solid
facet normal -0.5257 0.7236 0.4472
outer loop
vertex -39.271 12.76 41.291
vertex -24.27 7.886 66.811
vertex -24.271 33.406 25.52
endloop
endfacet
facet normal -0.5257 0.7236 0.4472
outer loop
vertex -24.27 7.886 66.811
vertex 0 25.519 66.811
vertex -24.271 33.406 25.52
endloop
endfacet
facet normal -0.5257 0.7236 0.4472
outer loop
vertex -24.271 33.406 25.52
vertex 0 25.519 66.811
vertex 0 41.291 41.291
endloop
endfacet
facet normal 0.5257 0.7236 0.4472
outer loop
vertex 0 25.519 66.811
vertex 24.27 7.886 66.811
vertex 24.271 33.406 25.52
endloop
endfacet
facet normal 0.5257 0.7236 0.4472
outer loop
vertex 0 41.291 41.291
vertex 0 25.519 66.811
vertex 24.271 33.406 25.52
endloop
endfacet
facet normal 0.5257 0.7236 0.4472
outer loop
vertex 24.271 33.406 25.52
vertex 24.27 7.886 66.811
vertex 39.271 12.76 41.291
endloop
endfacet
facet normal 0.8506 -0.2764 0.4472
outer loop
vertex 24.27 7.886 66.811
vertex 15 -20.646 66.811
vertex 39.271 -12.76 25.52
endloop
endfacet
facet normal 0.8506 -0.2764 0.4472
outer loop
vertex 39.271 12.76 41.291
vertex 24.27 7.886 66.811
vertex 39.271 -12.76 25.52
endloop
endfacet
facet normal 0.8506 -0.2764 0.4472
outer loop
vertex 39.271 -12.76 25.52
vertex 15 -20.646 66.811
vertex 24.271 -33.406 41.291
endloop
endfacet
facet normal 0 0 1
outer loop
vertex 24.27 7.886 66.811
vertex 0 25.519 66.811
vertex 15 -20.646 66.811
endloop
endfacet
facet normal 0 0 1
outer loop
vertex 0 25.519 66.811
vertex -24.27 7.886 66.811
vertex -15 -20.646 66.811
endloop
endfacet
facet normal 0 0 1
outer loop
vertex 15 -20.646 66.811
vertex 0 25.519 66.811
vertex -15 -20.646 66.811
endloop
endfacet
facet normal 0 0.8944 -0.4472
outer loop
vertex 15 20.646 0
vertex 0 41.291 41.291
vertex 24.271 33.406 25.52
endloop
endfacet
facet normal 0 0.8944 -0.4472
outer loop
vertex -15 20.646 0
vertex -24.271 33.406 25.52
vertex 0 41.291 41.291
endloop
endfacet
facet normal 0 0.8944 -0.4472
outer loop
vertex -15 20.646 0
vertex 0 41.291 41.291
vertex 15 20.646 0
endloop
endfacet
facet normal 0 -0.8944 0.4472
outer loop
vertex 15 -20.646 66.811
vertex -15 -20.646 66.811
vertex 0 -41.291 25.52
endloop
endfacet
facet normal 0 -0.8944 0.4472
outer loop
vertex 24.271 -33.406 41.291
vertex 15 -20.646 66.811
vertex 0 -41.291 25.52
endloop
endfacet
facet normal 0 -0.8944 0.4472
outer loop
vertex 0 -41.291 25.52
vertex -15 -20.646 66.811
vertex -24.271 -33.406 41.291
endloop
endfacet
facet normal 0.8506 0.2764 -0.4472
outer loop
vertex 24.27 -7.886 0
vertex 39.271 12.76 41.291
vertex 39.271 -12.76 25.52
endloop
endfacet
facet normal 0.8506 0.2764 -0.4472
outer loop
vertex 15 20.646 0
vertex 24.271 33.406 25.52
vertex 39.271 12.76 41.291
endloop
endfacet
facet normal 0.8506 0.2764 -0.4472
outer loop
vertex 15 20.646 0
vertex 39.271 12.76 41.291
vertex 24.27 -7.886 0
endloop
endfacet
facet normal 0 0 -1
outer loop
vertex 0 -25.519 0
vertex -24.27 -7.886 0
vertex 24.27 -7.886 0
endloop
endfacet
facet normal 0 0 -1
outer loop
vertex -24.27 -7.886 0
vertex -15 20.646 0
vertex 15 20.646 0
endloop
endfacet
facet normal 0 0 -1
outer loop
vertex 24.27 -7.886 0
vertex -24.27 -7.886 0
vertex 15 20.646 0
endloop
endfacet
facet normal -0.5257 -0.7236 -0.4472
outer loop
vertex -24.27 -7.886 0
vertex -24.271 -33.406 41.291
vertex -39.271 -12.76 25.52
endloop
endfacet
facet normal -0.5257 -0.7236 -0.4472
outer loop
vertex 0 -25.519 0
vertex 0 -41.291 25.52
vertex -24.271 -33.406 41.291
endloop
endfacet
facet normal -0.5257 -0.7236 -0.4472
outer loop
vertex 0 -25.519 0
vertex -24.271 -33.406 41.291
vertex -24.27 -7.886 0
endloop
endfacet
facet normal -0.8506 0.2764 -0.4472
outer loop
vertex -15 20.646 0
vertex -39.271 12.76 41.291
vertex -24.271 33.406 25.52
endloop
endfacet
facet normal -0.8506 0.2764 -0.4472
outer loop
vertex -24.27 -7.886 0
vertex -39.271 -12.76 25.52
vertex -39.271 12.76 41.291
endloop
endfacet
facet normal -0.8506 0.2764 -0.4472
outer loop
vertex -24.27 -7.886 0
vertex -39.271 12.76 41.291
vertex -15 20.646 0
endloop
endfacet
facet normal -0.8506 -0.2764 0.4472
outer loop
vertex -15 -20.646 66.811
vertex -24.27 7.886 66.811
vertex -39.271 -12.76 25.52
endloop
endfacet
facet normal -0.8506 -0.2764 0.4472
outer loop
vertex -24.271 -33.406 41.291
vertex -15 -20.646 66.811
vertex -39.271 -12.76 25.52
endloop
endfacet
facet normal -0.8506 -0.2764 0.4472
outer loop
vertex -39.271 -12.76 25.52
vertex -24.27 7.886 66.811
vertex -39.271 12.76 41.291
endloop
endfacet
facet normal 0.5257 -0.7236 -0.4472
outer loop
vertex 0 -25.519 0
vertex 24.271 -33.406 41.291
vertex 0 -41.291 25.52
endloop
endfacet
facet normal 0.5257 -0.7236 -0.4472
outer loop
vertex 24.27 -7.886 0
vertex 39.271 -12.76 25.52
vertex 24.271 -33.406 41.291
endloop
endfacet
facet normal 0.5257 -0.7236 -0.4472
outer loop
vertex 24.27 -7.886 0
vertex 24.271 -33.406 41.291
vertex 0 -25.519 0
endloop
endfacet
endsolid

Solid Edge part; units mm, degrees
sketch "Sketch1" plane through (0, 0, 0) normal (1, 0, 0) x (0, 1, 0)
  line L0 (0, 125.7387) -> (0, -58.9278)
  arc A0 (0, 125.7388) -> (0, -58.9278) centre (0, 33.4055) cw
revolve "RevolvedProtrusion1" add sketch "Sketch1" angle 360 about axis through (0, 0, 125.7387) along (0, 0, -1)
sketch "Sketch2" plane through (0, 0, 0) normal (1, 0, 0) x (0, 1, 0)
  line L0 (-41.2915, 25.5195) -> (-25.5195, 0)
  line L1 (-20.6457, 66.811) -> (-41.2915, 25.5195)
  line L2 (25.5195, 66.811) -> (-20.6457, 66.811)
  line L3 (41.2915, 41.2915) -> (25.5195, 66.811)
  line L4 (20.6457, 0) -> (41.2915, 41.2915)
extrude "Cutout1" cut sketch "Sketch2" along normal mid plane 232.5761 material side at (0, -33.448, 12.7335)
pattern_circular "Pattern1" count 5 over 360 about axis through (0, 0, 66.811) along (0, 0, 1) of "Cutout1"
sketch "Sketch3" plane through (0, 0, 0) normal (0, 0, 1) x (1, 0, 0)
  line L0 (24.2705, -7.886) -> (15, 20.6457)
  line L1 (15, 20.6457) -> (-15, 20.6457)
  line L2 (-15, 20.6457) -> (-24.2705, -7.886)
  line L3 (-24.2705, -7.886) -> (0, -25.5195)
  line L4 (0, -25.5195) -> (24.2705, -7.886)
extrude "ExtrudedCutout_8" cut sketch "Sketch3" against normal blind 119.4
